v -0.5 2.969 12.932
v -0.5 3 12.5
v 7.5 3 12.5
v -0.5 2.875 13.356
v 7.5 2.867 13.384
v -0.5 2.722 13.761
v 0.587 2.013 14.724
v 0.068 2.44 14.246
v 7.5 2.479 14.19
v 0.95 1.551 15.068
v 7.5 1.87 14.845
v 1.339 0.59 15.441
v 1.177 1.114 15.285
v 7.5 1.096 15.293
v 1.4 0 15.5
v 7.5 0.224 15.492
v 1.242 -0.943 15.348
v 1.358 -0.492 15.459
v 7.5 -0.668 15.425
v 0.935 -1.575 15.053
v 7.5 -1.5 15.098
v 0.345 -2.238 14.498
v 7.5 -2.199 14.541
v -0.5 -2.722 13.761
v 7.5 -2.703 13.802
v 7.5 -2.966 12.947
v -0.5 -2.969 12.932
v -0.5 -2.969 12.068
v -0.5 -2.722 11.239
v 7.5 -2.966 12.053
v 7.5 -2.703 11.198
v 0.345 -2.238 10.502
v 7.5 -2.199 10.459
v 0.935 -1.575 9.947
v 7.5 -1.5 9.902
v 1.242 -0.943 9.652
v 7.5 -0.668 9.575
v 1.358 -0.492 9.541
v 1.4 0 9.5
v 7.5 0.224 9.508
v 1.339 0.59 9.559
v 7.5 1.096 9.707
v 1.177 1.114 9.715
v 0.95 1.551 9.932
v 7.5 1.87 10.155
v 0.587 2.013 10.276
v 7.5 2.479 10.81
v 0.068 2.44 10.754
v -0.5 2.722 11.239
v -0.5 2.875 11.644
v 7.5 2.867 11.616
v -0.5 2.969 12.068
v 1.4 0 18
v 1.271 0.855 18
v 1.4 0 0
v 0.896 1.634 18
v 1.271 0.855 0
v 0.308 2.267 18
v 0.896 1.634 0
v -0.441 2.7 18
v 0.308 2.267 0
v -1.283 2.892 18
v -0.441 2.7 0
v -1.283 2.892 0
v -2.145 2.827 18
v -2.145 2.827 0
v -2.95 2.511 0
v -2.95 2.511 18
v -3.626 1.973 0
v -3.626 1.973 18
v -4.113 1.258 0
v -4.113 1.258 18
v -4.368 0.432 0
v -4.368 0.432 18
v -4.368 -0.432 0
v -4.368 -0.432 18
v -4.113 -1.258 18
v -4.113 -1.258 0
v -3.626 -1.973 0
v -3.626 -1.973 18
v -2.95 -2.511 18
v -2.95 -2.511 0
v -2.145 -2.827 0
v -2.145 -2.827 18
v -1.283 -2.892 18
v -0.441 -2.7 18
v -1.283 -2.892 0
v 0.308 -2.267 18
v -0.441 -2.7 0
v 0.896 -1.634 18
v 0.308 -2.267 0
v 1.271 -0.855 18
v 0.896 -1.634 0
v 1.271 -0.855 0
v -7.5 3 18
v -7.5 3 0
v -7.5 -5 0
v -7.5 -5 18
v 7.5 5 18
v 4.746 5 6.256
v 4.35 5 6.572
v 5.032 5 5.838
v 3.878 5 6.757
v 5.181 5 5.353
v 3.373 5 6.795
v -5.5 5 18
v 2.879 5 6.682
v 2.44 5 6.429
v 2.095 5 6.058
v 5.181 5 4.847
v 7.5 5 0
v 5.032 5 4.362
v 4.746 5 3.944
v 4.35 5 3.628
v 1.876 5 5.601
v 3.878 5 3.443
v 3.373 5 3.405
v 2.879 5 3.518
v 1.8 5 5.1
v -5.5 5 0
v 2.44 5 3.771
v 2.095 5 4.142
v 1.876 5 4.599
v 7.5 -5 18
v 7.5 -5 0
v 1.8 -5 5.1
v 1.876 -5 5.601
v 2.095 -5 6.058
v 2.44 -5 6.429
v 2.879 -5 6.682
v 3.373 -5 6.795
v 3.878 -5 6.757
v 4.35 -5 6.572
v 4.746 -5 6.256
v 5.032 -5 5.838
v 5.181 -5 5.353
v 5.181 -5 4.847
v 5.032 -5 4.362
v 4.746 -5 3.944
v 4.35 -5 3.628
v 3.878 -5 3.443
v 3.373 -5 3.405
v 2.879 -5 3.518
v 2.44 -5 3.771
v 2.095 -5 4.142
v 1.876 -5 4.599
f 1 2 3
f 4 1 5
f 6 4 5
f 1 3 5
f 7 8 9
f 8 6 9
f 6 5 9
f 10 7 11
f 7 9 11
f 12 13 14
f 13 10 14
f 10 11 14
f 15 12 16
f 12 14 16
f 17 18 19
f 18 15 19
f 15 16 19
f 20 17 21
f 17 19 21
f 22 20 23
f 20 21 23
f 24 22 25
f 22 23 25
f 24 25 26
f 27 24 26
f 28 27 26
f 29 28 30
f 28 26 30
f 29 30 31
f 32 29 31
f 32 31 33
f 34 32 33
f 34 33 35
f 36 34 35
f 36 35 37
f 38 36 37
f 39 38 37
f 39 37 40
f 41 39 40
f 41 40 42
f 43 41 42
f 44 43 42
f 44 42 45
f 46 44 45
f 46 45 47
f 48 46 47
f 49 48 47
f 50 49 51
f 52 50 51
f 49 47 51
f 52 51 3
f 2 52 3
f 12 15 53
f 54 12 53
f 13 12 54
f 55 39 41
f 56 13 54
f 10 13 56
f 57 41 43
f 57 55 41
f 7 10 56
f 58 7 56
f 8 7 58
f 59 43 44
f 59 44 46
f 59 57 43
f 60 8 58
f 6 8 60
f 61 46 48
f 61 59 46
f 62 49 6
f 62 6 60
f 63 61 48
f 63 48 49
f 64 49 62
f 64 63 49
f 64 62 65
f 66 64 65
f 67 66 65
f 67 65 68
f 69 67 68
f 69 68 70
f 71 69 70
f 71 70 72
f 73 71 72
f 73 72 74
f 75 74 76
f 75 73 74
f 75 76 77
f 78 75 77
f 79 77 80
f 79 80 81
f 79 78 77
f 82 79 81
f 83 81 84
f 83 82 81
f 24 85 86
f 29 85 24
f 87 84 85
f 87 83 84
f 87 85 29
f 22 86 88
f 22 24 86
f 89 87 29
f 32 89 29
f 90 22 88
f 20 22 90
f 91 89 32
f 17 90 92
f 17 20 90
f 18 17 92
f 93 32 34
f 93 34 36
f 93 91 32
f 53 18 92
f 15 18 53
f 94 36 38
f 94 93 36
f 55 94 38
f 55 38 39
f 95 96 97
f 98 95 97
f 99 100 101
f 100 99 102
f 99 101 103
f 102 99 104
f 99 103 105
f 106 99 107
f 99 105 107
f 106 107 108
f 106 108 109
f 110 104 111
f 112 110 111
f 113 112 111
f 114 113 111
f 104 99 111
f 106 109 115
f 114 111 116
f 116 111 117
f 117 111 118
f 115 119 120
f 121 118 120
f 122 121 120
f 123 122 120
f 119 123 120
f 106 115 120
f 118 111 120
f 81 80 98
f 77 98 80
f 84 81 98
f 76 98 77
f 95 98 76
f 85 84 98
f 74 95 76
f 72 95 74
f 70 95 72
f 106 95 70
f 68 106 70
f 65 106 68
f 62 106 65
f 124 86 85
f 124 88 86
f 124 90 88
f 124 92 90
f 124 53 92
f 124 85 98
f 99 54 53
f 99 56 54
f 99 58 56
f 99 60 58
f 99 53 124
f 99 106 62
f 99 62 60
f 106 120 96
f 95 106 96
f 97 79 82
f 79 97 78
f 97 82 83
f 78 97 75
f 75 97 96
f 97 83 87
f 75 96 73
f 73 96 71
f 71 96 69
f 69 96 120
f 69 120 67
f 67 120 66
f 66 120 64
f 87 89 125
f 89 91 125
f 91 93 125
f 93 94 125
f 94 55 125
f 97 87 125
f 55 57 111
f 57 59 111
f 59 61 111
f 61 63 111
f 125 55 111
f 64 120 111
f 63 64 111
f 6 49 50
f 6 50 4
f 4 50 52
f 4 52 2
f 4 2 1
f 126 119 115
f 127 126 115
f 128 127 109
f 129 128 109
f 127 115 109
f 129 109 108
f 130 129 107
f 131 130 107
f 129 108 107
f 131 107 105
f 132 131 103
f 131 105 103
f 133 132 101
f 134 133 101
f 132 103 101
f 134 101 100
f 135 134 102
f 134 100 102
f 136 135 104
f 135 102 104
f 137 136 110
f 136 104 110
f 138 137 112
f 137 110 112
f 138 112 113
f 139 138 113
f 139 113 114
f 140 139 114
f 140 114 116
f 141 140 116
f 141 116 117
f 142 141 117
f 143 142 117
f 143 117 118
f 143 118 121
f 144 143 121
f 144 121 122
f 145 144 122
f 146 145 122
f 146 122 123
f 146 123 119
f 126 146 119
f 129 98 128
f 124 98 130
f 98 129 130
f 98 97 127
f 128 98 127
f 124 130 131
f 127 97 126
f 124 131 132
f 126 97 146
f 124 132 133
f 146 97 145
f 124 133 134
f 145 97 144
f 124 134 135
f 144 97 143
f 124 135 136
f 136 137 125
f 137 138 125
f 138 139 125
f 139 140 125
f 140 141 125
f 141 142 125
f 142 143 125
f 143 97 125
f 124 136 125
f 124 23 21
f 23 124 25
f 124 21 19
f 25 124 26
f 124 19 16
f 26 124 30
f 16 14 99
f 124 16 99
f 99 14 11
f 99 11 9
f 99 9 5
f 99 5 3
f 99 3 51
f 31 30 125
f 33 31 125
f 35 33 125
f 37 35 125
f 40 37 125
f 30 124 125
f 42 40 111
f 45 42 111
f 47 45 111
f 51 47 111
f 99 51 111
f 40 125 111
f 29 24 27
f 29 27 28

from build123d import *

# Parameters (mm, degrees)
F0_R     = 2.9
F1_DEPTH = 18
F3_R     = 1.7
F4_DEPTH = 10.001
F2_R     = 3
F5_DEPTH = 8


with BuildPart() as f1:
    # F0 (on Top) → F1 (new body)
    with BuildSketch(Plane.XY):
        Polygon((7.5, -5), (7.5, 5), (-5.5, 5), (-7.5, 3), (-7.5, -5), align=None)
        with Locations((-1.5, 0)):
            Circle(F0_R, mode=Mode.SUBTRACT)
    extrude(amount=F1_DEPTH)

    # F3 (on face) → F4 (cut, through all)
    with BuildSketch(Plane(origin=(0, 5, 0), x_dir=(-1, 0, 0), z_dir=(0, 1, 0))):
        with Locations((-3.5, 5.1)):
            Circle(F3_R)
    extrude(amount=-F4_DEPTH, mode=Mode.SUBTRACT)

    # F2 (on face) → F5 (cut)
    with BuildSketch(Plane.YZ.offset(7.5)):
        with Locations((0, 12.5)):
            Circle(F2_R)
    extrude(amount=-F5_DEPTH, mode=Mode.SUBTRACT)


solid = f1.part
